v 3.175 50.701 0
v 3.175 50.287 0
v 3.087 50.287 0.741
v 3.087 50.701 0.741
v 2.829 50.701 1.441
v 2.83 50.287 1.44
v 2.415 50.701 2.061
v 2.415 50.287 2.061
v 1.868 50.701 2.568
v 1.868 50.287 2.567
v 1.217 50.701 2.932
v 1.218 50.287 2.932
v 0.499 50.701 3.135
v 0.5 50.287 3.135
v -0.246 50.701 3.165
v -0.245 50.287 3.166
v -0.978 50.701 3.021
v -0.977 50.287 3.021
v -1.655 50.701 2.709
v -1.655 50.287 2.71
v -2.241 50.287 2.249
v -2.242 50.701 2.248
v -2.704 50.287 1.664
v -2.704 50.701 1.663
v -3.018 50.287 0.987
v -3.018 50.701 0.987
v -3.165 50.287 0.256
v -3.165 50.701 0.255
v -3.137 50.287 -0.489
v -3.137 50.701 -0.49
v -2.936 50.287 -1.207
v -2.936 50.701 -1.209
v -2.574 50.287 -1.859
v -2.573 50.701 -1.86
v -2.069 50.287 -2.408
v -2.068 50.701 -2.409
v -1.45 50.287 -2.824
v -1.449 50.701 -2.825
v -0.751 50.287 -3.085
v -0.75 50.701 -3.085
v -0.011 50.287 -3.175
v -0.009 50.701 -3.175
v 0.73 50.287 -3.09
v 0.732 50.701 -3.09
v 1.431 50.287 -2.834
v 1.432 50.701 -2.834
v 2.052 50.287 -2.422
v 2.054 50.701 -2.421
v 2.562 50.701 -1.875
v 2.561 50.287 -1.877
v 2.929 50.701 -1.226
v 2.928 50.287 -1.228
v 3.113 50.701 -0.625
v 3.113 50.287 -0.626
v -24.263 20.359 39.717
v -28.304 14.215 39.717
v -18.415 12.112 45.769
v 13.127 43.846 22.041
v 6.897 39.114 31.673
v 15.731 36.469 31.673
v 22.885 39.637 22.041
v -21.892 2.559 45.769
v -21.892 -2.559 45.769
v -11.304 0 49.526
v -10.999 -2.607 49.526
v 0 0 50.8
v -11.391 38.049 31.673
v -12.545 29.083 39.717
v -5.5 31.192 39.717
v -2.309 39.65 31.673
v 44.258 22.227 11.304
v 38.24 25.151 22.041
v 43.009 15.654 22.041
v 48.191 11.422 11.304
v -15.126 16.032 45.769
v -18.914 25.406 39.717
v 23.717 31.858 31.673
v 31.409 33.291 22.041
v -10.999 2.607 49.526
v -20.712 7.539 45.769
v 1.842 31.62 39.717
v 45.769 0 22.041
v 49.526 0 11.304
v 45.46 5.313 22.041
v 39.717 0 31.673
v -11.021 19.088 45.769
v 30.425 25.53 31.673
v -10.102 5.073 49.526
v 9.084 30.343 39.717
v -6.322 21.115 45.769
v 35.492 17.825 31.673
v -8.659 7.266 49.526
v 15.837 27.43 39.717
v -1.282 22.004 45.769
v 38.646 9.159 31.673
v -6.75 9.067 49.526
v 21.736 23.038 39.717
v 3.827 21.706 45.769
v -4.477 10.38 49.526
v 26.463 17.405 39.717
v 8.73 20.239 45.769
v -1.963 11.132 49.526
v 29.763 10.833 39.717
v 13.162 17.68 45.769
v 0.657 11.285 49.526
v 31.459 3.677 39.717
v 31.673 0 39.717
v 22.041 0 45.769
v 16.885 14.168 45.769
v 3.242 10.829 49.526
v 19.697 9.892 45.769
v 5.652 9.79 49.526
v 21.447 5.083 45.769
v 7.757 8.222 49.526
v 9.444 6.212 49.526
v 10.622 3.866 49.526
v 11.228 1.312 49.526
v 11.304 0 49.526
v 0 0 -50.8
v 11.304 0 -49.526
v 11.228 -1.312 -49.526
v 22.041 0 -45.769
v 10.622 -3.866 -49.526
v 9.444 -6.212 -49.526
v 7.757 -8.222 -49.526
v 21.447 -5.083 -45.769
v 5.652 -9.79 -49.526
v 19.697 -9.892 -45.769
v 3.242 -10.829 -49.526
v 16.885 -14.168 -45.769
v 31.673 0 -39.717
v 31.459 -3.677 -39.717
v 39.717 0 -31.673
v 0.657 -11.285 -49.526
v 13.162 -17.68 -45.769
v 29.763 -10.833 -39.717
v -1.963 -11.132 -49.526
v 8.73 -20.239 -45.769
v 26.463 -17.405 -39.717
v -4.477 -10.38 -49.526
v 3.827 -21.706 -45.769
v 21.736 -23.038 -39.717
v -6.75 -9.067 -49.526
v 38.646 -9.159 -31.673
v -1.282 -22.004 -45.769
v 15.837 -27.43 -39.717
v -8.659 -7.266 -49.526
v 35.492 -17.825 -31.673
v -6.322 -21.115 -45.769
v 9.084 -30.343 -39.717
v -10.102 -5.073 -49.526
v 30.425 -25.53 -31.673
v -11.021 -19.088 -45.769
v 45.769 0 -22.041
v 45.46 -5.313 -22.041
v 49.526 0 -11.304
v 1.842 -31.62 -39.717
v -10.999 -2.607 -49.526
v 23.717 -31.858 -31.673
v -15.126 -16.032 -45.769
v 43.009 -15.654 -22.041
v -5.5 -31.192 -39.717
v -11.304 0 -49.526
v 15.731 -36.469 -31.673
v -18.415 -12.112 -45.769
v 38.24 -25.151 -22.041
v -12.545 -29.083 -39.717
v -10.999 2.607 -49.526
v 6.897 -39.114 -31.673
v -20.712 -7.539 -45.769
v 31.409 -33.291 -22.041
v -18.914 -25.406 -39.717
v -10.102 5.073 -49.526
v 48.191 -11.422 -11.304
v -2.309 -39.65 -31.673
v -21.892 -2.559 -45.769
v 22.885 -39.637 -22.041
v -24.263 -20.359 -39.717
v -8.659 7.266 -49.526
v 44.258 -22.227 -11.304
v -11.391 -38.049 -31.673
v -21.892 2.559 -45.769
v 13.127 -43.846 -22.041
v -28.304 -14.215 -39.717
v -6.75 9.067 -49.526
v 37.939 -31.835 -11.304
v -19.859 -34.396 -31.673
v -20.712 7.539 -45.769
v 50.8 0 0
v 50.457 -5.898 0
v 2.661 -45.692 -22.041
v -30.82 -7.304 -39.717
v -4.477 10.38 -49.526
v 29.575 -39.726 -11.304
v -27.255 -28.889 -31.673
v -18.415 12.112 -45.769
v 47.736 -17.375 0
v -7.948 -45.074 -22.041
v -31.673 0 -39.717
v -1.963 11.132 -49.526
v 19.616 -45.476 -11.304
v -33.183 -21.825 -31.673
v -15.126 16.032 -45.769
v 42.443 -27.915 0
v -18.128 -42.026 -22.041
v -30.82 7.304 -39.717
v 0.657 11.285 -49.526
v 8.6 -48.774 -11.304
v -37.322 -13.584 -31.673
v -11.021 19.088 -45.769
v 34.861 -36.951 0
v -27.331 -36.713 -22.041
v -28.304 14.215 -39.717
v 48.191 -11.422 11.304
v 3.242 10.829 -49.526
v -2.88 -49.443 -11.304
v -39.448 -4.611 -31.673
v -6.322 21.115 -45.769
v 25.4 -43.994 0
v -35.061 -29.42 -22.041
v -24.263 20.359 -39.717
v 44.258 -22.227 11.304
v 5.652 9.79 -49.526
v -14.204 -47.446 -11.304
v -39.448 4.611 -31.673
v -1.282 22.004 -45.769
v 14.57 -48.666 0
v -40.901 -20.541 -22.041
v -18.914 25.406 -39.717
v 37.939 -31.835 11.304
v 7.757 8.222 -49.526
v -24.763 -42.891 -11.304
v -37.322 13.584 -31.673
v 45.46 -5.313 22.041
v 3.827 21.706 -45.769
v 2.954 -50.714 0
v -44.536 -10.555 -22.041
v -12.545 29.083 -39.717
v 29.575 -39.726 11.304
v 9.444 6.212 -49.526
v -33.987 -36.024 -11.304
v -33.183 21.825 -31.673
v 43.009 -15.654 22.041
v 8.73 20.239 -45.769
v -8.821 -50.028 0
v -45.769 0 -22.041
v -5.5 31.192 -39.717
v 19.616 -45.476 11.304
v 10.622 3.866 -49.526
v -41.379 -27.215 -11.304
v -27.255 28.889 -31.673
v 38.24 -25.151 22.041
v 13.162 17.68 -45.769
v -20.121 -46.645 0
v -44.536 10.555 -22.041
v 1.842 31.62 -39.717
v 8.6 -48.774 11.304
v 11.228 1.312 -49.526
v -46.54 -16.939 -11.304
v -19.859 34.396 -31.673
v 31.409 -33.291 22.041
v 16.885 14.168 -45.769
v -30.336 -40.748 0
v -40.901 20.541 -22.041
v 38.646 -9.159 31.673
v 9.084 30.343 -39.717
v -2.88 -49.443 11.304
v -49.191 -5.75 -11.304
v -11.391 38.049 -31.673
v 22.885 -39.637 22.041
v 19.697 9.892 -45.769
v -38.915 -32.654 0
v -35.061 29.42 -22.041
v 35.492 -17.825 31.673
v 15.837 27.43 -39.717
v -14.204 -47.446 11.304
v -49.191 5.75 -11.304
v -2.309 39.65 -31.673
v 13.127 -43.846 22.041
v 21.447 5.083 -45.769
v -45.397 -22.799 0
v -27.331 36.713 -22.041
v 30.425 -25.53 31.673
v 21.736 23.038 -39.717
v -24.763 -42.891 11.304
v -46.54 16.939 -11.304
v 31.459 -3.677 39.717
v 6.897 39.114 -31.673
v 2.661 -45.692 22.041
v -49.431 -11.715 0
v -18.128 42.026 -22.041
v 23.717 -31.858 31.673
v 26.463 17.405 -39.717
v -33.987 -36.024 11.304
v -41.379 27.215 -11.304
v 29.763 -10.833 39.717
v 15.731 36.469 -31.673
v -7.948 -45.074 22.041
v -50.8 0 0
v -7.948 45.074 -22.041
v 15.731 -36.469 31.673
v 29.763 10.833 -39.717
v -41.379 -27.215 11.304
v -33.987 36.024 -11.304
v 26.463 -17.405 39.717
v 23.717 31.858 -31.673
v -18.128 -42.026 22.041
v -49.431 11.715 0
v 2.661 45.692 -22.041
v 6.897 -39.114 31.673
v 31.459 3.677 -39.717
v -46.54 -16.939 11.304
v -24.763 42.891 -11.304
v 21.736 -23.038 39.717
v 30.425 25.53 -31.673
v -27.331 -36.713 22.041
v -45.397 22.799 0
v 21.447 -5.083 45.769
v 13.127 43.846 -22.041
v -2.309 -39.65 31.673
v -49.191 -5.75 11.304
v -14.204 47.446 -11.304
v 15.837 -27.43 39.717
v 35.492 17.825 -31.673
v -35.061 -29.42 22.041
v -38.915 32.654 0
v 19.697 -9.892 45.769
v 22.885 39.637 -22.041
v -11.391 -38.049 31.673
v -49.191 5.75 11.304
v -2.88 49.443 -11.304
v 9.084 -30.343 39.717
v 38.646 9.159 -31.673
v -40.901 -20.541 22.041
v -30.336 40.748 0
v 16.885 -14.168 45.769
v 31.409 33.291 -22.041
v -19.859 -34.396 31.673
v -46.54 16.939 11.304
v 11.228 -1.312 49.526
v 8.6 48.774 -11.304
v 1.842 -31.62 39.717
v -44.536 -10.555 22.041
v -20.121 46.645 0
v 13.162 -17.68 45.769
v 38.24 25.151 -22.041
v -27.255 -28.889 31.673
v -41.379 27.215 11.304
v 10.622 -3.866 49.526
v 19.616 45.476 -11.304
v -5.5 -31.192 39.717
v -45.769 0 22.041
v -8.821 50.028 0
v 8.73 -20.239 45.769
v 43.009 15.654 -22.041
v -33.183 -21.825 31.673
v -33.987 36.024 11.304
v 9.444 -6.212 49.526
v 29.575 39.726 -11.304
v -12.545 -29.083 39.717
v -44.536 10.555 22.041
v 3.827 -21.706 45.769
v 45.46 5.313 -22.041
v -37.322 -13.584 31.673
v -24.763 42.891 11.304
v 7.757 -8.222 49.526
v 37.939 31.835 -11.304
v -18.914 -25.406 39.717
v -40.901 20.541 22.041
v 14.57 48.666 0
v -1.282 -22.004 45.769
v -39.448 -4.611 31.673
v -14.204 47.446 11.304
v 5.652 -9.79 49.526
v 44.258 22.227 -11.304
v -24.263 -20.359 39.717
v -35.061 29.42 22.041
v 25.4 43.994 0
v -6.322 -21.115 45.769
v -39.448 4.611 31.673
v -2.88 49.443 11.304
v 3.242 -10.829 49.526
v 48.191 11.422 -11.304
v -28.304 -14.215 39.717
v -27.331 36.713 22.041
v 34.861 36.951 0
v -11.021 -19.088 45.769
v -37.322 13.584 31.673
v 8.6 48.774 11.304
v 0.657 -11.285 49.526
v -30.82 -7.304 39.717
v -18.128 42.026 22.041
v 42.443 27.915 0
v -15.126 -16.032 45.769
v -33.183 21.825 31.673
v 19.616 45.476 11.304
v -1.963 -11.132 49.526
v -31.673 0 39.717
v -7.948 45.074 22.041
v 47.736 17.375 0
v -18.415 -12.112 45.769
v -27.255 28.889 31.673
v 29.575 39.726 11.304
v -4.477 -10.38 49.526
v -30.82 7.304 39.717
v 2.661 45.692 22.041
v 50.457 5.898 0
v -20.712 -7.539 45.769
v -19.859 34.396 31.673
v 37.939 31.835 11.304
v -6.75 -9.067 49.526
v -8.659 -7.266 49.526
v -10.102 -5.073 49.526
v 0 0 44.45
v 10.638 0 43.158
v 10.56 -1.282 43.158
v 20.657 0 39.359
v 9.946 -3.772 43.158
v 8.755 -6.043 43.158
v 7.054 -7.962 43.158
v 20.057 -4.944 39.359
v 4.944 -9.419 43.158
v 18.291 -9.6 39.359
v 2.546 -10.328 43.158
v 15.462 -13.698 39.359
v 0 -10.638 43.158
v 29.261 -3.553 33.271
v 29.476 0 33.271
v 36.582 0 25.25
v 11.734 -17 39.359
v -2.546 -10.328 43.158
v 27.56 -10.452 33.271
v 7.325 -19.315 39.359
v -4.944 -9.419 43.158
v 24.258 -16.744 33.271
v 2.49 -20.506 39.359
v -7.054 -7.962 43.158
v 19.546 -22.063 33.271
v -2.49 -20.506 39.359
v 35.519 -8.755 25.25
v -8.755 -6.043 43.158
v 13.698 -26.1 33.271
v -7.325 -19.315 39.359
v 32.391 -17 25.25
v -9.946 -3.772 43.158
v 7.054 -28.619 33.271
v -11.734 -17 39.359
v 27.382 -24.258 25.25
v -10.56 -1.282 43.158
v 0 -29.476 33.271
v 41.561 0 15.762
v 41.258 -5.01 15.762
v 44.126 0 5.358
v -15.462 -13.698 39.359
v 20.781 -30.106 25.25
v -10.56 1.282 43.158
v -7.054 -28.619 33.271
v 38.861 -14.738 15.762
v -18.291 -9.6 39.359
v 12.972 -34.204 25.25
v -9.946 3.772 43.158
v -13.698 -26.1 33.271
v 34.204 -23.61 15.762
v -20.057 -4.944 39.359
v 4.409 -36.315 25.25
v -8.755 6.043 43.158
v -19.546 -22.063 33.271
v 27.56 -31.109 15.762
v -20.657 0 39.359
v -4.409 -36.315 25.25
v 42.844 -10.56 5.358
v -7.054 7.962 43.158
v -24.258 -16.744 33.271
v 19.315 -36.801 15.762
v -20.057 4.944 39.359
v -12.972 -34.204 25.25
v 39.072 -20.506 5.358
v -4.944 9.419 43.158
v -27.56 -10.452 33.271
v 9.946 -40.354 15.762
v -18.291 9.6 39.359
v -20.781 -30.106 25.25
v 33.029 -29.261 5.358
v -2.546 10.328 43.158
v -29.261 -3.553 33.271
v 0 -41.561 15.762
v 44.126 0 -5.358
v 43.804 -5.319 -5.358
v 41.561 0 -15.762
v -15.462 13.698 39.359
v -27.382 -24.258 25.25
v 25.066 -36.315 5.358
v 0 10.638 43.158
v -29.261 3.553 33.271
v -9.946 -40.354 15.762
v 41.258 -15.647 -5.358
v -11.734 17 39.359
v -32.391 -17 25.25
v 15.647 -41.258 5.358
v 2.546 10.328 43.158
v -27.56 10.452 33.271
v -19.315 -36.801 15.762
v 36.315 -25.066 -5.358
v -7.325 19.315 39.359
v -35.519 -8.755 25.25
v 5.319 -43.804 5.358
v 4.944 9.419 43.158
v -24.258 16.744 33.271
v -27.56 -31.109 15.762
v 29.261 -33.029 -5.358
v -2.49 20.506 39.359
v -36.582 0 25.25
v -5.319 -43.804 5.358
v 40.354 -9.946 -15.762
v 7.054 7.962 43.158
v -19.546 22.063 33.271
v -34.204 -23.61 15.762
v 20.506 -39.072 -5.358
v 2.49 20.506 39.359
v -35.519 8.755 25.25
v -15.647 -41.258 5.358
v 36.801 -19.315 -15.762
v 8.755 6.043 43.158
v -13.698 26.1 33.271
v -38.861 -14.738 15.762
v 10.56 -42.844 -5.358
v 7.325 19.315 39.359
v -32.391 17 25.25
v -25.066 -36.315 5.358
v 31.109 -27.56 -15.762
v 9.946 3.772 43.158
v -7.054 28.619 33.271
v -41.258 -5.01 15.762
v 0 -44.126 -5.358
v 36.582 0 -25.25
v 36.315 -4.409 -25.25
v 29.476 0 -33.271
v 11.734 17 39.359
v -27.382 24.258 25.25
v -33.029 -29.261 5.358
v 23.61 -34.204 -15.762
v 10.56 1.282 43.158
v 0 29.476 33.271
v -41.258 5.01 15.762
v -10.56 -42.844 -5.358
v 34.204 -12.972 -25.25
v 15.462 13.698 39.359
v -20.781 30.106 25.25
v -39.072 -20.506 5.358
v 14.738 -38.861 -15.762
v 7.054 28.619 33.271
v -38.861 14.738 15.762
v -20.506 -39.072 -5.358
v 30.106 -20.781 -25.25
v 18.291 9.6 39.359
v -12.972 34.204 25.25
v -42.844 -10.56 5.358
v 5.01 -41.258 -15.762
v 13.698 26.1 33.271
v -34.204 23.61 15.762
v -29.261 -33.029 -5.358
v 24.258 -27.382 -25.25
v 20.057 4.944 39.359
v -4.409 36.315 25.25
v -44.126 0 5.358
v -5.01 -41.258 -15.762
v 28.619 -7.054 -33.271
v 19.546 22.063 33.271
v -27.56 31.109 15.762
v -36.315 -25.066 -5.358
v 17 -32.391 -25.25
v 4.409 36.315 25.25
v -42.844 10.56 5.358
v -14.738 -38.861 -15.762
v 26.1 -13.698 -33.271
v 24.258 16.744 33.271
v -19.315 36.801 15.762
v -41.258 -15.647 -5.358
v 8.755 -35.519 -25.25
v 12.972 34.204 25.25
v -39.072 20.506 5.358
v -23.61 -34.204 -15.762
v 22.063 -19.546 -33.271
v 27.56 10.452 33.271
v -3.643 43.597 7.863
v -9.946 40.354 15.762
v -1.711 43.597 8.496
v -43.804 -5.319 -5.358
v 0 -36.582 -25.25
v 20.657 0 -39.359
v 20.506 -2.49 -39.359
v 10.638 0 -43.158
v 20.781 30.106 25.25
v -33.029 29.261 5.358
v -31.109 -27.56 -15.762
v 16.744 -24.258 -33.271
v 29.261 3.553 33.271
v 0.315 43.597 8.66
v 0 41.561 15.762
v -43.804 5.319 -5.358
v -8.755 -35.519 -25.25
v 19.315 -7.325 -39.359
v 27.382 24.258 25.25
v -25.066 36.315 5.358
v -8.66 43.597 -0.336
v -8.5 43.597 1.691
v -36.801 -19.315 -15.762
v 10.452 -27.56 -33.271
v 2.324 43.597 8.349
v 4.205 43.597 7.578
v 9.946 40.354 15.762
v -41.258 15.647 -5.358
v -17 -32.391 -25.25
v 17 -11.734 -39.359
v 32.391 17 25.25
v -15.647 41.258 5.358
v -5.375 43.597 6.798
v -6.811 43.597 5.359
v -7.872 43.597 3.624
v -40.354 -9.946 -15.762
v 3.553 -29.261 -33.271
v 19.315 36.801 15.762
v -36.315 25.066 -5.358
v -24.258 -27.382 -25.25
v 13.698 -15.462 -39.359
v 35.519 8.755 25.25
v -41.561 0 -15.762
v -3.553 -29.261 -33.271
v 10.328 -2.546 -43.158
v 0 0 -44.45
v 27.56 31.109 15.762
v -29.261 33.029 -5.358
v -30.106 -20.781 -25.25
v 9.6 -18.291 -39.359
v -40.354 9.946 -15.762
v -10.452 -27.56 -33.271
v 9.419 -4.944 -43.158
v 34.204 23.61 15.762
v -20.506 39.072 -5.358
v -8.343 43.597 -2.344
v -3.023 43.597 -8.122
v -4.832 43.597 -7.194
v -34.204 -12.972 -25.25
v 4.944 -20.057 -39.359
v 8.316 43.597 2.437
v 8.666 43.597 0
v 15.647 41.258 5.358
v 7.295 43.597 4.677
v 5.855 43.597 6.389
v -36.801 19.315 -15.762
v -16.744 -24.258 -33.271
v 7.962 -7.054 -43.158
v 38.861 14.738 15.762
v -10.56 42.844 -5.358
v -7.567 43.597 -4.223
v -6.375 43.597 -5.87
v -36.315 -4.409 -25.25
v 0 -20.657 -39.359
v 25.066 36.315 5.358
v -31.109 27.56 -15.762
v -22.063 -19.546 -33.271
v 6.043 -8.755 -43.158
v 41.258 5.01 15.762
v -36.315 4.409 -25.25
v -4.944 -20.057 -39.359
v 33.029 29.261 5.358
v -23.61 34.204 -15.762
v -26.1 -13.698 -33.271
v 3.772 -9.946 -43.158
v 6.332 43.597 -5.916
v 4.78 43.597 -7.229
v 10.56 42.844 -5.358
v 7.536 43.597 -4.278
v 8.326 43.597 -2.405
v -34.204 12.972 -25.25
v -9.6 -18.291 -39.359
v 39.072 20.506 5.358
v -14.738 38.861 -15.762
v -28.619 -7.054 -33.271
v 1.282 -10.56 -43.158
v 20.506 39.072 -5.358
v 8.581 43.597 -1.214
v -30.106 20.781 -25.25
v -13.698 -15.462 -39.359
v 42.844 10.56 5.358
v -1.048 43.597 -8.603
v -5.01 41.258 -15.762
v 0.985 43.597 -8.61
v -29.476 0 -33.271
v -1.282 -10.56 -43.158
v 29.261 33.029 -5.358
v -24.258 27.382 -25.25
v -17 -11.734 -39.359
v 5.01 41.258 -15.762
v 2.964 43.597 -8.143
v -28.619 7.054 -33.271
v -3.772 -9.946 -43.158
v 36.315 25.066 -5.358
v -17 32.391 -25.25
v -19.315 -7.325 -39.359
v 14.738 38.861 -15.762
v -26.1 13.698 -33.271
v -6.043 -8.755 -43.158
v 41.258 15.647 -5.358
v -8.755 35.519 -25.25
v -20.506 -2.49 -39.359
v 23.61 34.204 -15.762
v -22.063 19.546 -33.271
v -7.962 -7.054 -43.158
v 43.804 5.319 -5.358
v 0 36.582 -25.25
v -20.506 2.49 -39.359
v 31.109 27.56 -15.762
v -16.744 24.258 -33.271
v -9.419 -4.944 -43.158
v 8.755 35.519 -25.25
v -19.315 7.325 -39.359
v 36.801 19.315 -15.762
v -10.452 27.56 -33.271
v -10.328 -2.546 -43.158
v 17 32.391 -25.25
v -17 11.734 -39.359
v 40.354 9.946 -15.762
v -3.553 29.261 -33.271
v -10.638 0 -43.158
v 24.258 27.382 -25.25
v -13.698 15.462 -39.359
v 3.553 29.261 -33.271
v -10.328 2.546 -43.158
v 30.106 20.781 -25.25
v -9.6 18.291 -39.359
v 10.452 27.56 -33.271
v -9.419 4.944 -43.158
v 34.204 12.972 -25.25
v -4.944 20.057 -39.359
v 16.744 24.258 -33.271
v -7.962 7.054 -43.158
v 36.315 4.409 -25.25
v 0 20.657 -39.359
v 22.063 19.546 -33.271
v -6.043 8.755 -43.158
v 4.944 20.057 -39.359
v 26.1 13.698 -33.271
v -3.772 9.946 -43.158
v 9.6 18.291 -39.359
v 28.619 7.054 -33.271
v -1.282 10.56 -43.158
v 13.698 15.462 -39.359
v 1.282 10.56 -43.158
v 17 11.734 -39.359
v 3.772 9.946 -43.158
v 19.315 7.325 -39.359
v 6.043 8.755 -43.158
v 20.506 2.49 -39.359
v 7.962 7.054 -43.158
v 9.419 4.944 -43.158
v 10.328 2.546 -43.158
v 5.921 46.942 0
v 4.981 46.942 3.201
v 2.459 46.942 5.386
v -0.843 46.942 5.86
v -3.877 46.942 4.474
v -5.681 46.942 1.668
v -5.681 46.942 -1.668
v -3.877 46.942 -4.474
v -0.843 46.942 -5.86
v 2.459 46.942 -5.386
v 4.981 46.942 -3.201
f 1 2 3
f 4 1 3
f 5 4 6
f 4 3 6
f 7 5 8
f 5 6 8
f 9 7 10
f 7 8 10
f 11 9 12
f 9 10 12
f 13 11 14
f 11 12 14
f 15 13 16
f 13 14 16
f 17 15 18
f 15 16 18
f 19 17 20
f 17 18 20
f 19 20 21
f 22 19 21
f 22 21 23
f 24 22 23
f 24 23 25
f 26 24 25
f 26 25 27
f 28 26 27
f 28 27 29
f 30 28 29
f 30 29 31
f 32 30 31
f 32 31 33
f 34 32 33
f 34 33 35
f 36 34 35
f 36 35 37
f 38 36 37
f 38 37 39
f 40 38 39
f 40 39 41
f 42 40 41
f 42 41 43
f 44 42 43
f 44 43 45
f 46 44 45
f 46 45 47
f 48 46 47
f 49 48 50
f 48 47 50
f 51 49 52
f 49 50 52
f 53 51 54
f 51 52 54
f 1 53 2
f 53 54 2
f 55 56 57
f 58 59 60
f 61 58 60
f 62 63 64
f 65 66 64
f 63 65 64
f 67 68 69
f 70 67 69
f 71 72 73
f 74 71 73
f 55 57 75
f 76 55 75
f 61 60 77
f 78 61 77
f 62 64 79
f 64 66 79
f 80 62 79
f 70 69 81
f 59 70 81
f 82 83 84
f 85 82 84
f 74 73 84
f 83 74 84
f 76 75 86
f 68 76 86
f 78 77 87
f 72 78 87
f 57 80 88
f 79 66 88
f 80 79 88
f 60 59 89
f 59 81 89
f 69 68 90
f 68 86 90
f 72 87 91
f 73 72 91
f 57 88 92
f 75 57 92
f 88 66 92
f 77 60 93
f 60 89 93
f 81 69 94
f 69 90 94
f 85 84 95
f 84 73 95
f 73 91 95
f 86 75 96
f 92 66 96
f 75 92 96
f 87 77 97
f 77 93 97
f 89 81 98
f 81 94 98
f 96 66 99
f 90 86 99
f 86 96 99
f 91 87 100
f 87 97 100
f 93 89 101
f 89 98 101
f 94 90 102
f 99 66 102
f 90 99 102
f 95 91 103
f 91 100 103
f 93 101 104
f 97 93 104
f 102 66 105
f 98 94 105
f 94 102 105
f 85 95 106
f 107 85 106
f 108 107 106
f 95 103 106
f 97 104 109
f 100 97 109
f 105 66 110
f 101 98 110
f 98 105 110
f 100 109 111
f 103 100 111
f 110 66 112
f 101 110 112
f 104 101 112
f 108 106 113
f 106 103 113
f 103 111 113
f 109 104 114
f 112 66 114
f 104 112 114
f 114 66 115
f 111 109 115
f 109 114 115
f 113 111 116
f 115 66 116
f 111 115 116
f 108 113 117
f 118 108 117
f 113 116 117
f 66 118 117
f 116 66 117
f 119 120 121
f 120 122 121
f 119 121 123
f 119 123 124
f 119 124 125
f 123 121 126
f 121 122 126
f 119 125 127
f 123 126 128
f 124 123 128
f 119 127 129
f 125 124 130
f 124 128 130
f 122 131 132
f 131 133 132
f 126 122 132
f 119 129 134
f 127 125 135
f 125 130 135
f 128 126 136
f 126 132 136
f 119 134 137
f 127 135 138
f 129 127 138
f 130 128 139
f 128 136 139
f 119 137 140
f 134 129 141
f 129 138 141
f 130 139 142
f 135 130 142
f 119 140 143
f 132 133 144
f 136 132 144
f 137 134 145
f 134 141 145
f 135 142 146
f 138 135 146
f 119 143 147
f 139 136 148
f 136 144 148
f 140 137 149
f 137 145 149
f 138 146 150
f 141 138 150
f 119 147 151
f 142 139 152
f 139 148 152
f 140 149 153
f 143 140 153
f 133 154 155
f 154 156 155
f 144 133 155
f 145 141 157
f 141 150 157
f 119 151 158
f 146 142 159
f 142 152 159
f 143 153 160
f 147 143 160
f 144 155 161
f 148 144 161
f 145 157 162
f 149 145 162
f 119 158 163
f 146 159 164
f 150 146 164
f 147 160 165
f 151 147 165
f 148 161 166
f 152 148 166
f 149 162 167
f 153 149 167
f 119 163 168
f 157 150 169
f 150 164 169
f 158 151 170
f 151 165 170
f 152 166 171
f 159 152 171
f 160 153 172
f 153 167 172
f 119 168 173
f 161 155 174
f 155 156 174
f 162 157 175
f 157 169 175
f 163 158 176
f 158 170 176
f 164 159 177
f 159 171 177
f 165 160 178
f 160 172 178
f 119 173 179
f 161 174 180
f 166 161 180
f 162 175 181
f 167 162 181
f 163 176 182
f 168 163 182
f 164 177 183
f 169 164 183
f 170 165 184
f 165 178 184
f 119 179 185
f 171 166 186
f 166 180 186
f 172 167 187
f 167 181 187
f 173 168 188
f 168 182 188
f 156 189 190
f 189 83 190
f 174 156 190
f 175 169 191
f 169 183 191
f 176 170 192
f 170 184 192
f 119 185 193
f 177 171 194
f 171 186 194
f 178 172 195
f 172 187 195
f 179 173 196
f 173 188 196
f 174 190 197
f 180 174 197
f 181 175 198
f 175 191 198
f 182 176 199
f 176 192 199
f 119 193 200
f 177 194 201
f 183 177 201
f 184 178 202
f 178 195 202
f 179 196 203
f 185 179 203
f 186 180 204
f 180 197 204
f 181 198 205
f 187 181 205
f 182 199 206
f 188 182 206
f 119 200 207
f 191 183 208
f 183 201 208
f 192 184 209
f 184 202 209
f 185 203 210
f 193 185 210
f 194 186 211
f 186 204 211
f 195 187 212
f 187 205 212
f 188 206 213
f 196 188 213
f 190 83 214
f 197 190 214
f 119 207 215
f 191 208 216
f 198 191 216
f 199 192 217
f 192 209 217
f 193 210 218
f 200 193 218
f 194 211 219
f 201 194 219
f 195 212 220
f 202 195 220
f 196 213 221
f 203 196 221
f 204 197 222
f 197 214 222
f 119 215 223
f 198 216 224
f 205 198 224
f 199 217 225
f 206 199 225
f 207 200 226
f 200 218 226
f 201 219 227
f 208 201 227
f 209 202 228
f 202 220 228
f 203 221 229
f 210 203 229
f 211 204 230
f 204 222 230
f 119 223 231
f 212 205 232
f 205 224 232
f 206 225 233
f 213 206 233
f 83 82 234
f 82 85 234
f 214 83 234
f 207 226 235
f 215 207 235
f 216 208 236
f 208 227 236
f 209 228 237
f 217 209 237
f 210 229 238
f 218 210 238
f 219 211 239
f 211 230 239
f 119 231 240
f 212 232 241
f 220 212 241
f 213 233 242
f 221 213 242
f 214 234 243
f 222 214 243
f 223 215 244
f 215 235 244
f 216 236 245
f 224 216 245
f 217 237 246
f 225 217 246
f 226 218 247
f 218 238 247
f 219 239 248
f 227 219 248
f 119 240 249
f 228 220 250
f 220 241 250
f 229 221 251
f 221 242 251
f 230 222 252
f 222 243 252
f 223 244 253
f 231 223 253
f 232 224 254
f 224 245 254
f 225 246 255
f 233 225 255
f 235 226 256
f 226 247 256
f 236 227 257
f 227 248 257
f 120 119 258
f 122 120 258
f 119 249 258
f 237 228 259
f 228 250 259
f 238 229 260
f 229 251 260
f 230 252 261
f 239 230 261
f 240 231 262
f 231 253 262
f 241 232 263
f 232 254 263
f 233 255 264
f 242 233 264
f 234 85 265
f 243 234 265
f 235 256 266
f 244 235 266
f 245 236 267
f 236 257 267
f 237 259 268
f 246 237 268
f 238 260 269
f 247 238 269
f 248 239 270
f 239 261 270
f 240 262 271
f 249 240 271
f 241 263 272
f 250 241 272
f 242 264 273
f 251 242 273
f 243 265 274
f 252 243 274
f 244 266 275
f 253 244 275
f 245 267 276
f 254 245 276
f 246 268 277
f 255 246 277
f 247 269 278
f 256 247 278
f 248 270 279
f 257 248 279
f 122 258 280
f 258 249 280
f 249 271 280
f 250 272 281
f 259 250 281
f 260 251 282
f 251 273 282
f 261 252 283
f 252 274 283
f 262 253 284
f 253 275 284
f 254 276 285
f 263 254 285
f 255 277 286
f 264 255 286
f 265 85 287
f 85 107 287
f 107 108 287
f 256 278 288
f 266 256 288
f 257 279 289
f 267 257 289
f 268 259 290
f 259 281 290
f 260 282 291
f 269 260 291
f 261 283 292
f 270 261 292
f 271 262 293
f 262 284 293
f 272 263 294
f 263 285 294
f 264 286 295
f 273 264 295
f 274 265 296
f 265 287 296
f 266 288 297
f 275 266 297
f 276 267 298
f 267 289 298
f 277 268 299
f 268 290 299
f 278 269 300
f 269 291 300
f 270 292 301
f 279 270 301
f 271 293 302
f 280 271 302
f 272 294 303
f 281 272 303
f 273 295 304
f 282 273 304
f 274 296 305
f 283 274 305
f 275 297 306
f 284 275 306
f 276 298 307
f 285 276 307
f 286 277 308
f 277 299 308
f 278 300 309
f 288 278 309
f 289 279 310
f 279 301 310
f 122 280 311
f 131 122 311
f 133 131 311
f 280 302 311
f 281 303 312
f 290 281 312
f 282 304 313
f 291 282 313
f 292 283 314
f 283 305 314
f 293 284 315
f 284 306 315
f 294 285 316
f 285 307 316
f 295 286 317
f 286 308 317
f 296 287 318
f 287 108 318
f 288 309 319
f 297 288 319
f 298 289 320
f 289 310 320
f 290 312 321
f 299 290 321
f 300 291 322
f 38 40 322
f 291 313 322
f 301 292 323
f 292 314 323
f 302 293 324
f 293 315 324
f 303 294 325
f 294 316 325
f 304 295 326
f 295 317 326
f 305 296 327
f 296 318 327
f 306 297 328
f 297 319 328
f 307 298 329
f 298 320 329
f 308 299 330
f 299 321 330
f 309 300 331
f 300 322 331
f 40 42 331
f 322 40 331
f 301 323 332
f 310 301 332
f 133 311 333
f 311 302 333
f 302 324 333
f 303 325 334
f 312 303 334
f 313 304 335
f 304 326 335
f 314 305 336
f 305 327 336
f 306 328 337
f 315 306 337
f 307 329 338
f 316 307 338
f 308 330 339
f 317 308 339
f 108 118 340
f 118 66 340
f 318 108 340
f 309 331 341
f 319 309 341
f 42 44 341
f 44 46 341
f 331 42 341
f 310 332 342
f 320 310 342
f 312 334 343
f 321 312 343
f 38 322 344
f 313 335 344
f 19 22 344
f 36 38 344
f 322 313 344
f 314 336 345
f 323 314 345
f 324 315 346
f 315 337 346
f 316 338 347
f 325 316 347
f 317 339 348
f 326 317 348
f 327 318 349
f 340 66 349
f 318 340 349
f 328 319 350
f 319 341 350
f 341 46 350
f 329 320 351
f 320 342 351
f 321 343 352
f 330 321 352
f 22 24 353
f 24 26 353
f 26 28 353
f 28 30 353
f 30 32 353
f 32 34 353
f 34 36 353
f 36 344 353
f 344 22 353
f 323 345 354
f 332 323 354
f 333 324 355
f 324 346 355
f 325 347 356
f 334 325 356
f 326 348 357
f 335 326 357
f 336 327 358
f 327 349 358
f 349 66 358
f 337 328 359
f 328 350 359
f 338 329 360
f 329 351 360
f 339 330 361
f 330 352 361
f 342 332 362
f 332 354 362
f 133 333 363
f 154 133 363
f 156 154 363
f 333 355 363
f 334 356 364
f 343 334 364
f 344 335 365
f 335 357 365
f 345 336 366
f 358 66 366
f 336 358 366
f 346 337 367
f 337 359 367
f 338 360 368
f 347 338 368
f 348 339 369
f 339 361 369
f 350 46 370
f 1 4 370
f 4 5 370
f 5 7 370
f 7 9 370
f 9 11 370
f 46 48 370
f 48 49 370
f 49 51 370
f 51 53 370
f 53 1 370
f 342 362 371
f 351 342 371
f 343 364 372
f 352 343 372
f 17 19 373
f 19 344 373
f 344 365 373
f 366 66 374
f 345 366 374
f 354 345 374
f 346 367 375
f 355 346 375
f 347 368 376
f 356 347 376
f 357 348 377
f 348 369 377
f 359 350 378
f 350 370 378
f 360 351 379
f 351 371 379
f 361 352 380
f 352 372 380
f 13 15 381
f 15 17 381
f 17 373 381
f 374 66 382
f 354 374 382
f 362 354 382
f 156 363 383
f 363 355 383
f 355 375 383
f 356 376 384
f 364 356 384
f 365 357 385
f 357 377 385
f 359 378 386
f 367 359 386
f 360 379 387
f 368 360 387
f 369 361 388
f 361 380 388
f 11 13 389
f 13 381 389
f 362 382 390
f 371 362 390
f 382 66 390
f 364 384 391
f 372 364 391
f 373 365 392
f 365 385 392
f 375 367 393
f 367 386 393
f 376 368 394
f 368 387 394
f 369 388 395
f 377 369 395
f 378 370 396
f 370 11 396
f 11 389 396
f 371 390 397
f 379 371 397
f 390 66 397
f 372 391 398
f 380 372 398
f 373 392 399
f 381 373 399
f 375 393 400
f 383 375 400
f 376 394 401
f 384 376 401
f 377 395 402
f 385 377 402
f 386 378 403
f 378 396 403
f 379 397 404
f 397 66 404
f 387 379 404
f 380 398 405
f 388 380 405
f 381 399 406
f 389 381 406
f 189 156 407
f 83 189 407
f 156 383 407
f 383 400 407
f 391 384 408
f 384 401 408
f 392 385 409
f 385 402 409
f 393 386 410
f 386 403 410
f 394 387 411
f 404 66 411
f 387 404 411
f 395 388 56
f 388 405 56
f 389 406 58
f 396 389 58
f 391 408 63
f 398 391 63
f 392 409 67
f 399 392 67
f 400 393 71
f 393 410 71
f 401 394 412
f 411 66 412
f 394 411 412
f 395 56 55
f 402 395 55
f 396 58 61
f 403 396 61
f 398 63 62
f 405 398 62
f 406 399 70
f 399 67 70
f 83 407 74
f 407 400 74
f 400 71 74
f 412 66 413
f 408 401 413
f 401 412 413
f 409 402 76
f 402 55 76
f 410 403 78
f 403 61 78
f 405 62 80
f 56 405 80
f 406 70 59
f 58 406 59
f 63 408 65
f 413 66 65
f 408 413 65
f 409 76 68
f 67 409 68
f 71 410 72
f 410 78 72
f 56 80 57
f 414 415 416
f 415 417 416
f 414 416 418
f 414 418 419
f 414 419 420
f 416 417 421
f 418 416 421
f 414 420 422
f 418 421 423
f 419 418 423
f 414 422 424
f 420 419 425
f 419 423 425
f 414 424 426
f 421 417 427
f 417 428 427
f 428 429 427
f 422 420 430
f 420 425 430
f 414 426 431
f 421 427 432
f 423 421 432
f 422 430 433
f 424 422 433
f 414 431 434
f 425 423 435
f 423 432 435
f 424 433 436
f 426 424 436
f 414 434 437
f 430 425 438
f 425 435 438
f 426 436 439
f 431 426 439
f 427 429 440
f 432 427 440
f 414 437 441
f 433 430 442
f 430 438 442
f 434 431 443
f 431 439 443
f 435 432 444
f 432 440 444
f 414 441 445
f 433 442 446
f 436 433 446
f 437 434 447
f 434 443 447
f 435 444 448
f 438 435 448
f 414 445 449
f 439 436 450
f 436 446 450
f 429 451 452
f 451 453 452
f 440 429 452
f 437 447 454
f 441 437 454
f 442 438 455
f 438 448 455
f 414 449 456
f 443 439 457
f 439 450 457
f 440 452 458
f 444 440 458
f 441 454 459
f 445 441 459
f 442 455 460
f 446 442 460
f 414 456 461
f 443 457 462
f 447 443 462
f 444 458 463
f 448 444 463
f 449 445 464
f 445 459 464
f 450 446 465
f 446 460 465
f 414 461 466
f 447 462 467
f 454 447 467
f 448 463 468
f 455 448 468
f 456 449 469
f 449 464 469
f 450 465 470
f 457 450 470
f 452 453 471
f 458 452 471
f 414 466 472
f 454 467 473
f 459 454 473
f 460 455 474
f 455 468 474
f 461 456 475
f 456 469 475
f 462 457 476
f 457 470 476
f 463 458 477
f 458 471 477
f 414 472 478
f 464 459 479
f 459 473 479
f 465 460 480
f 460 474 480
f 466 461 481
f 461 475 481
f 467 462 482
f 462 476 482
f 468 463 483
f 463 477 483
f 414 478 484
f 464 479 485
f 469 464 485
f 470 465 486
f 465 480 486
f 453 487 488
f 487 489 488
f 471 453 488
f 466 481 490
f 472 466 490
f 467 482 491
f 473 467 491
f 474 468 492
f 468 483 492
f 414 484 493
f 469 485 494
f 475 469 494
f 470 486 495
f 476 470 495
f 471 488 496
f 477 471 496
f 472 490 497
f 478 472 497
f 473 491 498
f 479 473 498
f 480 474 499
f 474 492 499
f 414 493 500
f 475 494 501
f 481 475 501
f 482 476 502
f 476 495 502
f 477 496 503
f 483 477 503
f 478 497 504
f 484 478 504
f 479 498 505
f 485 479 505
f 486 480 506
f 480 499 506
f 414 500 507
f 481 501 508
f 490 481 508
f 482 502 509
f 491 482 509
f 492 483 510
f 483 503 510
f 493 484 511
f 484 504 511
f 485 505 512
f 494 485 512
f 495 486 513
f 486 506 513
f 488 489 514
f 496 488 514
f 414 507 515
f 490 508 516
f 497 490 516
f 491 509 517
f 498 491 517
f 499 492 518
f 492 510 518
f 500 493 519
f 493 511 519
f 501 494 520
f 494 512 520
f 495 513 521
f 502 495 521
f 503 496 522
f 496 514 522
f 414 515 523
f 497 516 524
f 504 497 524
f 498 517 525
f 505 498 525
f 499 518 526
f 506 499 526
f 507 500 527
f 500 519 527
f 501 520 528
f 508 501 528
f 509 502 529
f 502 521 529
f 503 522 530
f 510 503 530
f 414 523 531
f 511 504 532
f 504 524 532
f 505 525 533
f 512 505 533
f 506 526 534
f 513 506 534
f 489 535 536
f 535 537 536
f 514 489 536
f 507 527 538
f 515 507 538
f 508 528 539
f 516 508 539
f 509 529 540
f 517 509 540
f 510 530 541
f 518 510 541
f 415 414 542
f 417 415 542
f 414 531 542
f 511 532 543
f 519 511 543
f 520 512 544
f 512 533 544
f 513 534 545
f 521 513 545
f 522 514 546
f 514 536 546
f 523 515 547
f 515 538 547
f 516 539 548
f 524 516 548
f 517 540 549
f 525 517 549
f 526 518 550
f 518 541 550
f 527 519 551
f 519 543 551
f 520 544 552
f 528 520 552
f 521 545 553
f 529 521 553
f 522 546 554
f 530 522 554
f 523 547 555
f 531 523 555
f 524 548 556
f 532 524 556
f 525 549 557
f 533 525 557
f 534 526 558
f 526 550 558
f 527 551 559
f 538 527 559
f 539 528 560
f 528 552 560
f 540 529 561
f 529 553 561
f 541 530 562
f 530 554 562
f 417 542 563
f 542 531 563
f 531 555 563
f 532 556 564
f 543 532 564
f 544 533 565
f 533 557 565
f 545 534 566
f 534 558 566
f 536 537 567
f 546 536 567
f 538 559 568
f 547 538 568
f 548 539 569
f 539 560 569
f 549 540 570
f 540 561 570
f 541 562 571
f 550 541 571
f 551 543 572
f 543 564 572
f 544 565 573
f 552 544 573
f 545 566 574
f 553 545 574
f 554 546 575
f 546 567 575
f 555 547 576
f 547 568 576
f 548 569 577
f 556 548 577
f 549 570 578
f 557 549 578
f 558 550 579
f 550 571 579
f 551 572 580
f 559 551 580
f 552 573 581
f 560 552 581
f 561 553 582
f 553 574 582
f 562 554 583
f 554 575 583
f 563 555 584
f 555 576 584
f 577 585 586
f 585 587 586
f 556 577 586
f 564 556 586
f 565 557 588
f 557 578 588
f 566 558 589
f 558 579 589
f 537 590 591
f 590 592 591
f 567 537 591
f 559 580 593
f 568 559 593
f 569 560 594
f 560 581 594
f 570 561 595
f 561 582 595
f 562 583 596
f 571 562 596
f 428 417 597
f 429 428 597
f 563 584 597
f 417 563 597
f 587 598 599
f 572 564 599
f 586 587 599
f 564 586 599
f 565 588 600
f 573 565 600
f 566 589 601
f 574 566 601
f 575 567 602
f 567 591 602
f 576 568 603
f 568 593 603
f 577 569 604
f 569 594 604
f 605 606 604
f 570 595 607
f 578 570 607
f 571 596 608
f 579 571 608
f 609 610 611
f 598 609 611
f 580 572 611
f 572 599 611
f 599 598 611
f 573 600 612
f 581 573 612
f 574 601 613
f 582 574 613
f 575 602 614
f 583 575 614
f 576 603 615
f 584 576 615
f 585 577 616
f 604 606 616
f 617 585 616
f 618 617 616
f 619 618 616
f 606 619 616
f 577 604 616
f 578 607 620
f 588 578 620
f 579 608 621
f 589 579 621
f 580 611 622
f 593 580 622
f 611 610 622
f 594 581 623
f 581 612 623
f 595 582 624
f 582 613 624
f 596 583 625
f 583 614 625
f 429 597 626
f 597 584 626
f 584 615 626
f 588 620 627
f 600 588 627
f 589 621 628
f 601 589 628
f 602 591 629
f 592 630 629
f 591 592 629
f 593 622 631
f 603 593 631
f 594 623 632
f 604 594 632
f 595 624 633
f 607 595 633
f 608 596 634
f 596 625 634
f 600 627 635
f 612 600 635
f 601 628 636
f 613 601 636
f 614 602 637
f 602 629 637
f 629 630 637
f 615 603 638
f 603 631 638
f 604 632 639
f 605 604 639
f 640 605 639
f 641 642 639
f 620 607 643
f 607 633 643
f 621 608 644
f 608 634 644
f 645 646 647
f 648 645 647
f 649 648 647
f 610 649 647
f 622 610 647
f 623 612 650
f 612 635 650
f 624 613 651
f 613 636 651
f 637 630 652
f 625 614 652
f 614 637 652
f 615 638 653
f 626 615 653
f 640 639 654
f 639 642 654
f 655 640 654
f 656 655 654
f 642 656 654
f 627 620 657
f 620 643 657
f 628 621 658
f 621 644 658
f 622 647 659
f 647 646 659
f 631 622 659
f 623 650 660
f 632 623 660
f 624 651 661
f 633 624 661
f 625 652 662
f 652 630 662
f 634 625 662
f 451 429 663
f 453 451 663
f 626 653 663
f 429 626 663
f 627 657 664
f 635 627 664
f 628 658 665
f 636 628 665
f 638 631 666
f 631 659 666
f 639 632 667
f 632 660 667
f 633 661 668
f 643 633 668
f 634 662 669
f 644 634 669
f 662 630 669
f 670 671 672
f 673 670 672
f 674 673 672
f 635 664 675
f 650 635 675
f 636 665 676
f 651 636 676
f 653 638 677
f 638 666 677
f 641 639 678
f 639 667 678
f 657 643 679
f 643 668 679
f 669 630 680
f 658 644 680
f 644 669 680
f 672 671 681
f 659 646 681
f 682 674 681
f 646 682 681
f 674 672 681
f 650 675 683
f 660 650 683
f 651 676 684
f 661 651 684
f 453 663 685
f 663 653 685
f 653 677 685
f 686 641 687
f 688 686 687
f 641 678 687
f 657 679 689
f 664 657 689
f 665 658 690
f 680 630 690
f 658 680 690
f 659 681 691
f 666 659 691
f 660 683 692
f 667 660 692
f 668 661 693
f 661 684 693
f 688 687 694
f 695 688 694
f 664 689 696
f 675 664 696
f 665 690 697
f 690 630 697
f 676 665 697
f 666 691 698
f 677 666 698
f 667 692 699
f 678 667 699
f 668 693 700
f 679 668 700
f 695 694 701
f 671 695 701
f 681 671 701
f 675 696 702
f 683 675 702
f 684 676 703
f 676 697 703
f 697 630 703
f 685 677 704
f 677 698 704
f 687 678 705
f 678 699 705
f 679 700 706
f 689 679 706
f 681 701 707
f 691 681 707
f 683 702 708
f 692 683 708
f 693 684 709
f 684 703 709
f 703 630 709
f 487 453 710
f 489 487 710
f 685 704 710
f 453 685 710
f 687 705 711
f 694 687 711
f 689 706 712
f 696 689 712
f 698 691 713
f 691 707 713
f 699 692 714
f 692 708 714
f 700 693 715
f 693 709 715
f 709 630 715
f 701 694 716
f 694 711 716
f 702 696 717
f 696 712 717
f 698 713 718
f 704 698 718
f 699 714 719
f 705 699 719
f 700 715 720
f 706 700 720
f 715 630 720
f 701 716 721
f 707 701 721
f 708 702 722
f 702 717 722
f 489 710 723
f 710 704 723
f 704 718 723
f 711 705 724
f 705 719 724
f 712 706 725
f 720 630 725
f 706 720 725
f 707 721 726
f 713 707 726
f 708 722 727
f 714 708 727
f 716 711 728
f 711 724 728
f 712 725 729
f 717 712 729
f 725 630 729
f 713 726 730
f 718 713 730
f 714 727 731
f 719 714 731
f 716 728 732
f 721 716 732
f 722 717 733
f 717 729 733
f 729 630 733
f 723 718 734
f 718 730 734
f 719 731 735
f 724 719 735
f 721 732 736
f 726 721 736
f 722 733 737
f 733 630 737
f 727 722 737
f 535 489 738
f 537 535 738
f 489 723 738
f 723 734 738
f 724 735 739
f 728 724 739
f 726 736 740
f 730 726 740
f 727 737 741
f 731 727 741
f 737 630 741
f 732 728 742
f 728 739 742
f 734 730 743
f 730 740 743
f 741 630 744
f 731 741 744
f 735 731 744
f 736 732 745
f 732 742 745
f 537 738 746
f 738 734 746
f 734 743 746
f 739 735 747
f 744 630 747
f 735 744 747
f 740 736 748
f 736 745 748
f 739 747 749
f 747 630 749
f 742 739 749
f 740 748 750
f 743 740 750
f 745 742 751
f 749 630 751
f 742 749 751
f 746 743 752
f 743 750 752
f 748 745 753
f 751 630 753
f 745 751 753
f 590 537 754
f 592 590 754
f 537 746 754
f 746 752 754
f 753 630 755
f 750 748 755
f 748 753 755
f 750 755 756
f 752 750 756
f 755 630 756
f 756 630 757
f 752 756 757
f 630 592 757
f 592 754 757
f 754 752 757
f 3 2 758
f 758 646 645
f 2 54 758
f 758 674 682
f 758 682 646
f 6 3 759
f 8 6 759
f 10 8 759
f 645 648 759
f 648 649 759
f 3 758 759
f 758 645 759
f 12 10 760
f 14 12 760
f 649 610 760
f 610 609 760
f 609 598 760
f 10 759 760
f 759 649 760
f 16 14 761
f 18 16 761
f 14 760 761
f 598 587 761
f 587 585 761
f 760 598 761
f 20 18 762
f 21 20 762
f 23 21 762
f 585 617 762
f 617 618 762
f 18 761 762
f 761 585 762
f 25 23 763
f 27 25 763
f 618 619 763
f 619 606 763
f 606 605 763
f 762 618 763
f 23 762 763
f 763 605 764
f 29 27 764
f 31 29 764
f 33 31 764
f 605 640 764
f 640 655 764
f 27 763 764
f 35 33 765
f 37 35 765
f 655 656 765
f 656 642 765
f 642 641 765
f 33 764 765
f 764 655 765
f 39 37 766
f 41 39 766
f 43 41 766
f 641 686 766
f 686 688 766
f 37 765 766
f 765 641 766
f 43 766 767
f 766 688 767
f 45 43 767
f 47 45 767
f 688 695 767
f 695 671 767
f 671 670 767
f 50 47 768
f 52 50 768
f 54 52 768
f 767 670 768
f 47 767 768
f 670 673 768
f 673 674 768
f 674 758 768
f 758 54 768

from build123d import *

# Parameters (mm, degrees)
F2_R     = 3.175
F3_DEPTH = 101.6


# Not quite as in the source:
# - a fillet or chamfer that OpenCascade refuses, or shapes differently, is made with other operations: its cross-section is extruded or revolved along the edge and cut away or added


with BuildPart() as f1:
    # F0 (on Front) → F1 (revolve)
    with BuildSketch(Plane.XZ):
        with BuildLine():
            ThreePointArc((0, -50.8), (50.8, 0), (0, 50.8))
            Line((0, 50.8), (0, 44.45))
            ThreePointArc((0, 44.45), (44.45, 0), (0, -44.45))
            Line((0, -44.45), (0, -50.8))
        make_face()
    revolve(axis=Axis((0, 0, 0), (0, 0, -1)))

    # F2 (on Front) → F3 (cut)
    with BuildSketch(Plane.XZ):
        Circle(F2_R)
    extrude(amount=-F3_DEPTH, mode=Mode.SUBTRACT)

    # F4: chamfer of 6.35 on 1 edges, made by hand

    # F4_s1 → F4_t2 (revolve, cut)
    with BuildSketch(Plane.XY.offset(-1.2e-09)):
        with BuildLine():
            Line((3.0138514094, 50.4834593112), (8.8272948956, 43.4006886388))
            Line((8.8272948956, 43.4006886388), (8.8025344773, 43.2761257162))
            ThreePointArc((8.8025344773, 43.2761257162), (6.0073622852, 43.914006044), (3.1659285713, 44.2097865329))
            Line((3.1659285713, 44.2097865329), (3.048, 44.336462139))
            ThreePointArc((3.048, 44.336462139), (3.047999955, 47.4099607251), (2.8868514094, 50.4834593112))
            Line((2.8868514094, 50.4834593112), (3.0138514094, 50.4834593112))
        make_face()
    revolve(axis=Axis((-2.25e-08, 44.336462139, -1.2e-09), (0, -1, 0)), mode=Mode.SUBTRACT)


solid = f1.part
